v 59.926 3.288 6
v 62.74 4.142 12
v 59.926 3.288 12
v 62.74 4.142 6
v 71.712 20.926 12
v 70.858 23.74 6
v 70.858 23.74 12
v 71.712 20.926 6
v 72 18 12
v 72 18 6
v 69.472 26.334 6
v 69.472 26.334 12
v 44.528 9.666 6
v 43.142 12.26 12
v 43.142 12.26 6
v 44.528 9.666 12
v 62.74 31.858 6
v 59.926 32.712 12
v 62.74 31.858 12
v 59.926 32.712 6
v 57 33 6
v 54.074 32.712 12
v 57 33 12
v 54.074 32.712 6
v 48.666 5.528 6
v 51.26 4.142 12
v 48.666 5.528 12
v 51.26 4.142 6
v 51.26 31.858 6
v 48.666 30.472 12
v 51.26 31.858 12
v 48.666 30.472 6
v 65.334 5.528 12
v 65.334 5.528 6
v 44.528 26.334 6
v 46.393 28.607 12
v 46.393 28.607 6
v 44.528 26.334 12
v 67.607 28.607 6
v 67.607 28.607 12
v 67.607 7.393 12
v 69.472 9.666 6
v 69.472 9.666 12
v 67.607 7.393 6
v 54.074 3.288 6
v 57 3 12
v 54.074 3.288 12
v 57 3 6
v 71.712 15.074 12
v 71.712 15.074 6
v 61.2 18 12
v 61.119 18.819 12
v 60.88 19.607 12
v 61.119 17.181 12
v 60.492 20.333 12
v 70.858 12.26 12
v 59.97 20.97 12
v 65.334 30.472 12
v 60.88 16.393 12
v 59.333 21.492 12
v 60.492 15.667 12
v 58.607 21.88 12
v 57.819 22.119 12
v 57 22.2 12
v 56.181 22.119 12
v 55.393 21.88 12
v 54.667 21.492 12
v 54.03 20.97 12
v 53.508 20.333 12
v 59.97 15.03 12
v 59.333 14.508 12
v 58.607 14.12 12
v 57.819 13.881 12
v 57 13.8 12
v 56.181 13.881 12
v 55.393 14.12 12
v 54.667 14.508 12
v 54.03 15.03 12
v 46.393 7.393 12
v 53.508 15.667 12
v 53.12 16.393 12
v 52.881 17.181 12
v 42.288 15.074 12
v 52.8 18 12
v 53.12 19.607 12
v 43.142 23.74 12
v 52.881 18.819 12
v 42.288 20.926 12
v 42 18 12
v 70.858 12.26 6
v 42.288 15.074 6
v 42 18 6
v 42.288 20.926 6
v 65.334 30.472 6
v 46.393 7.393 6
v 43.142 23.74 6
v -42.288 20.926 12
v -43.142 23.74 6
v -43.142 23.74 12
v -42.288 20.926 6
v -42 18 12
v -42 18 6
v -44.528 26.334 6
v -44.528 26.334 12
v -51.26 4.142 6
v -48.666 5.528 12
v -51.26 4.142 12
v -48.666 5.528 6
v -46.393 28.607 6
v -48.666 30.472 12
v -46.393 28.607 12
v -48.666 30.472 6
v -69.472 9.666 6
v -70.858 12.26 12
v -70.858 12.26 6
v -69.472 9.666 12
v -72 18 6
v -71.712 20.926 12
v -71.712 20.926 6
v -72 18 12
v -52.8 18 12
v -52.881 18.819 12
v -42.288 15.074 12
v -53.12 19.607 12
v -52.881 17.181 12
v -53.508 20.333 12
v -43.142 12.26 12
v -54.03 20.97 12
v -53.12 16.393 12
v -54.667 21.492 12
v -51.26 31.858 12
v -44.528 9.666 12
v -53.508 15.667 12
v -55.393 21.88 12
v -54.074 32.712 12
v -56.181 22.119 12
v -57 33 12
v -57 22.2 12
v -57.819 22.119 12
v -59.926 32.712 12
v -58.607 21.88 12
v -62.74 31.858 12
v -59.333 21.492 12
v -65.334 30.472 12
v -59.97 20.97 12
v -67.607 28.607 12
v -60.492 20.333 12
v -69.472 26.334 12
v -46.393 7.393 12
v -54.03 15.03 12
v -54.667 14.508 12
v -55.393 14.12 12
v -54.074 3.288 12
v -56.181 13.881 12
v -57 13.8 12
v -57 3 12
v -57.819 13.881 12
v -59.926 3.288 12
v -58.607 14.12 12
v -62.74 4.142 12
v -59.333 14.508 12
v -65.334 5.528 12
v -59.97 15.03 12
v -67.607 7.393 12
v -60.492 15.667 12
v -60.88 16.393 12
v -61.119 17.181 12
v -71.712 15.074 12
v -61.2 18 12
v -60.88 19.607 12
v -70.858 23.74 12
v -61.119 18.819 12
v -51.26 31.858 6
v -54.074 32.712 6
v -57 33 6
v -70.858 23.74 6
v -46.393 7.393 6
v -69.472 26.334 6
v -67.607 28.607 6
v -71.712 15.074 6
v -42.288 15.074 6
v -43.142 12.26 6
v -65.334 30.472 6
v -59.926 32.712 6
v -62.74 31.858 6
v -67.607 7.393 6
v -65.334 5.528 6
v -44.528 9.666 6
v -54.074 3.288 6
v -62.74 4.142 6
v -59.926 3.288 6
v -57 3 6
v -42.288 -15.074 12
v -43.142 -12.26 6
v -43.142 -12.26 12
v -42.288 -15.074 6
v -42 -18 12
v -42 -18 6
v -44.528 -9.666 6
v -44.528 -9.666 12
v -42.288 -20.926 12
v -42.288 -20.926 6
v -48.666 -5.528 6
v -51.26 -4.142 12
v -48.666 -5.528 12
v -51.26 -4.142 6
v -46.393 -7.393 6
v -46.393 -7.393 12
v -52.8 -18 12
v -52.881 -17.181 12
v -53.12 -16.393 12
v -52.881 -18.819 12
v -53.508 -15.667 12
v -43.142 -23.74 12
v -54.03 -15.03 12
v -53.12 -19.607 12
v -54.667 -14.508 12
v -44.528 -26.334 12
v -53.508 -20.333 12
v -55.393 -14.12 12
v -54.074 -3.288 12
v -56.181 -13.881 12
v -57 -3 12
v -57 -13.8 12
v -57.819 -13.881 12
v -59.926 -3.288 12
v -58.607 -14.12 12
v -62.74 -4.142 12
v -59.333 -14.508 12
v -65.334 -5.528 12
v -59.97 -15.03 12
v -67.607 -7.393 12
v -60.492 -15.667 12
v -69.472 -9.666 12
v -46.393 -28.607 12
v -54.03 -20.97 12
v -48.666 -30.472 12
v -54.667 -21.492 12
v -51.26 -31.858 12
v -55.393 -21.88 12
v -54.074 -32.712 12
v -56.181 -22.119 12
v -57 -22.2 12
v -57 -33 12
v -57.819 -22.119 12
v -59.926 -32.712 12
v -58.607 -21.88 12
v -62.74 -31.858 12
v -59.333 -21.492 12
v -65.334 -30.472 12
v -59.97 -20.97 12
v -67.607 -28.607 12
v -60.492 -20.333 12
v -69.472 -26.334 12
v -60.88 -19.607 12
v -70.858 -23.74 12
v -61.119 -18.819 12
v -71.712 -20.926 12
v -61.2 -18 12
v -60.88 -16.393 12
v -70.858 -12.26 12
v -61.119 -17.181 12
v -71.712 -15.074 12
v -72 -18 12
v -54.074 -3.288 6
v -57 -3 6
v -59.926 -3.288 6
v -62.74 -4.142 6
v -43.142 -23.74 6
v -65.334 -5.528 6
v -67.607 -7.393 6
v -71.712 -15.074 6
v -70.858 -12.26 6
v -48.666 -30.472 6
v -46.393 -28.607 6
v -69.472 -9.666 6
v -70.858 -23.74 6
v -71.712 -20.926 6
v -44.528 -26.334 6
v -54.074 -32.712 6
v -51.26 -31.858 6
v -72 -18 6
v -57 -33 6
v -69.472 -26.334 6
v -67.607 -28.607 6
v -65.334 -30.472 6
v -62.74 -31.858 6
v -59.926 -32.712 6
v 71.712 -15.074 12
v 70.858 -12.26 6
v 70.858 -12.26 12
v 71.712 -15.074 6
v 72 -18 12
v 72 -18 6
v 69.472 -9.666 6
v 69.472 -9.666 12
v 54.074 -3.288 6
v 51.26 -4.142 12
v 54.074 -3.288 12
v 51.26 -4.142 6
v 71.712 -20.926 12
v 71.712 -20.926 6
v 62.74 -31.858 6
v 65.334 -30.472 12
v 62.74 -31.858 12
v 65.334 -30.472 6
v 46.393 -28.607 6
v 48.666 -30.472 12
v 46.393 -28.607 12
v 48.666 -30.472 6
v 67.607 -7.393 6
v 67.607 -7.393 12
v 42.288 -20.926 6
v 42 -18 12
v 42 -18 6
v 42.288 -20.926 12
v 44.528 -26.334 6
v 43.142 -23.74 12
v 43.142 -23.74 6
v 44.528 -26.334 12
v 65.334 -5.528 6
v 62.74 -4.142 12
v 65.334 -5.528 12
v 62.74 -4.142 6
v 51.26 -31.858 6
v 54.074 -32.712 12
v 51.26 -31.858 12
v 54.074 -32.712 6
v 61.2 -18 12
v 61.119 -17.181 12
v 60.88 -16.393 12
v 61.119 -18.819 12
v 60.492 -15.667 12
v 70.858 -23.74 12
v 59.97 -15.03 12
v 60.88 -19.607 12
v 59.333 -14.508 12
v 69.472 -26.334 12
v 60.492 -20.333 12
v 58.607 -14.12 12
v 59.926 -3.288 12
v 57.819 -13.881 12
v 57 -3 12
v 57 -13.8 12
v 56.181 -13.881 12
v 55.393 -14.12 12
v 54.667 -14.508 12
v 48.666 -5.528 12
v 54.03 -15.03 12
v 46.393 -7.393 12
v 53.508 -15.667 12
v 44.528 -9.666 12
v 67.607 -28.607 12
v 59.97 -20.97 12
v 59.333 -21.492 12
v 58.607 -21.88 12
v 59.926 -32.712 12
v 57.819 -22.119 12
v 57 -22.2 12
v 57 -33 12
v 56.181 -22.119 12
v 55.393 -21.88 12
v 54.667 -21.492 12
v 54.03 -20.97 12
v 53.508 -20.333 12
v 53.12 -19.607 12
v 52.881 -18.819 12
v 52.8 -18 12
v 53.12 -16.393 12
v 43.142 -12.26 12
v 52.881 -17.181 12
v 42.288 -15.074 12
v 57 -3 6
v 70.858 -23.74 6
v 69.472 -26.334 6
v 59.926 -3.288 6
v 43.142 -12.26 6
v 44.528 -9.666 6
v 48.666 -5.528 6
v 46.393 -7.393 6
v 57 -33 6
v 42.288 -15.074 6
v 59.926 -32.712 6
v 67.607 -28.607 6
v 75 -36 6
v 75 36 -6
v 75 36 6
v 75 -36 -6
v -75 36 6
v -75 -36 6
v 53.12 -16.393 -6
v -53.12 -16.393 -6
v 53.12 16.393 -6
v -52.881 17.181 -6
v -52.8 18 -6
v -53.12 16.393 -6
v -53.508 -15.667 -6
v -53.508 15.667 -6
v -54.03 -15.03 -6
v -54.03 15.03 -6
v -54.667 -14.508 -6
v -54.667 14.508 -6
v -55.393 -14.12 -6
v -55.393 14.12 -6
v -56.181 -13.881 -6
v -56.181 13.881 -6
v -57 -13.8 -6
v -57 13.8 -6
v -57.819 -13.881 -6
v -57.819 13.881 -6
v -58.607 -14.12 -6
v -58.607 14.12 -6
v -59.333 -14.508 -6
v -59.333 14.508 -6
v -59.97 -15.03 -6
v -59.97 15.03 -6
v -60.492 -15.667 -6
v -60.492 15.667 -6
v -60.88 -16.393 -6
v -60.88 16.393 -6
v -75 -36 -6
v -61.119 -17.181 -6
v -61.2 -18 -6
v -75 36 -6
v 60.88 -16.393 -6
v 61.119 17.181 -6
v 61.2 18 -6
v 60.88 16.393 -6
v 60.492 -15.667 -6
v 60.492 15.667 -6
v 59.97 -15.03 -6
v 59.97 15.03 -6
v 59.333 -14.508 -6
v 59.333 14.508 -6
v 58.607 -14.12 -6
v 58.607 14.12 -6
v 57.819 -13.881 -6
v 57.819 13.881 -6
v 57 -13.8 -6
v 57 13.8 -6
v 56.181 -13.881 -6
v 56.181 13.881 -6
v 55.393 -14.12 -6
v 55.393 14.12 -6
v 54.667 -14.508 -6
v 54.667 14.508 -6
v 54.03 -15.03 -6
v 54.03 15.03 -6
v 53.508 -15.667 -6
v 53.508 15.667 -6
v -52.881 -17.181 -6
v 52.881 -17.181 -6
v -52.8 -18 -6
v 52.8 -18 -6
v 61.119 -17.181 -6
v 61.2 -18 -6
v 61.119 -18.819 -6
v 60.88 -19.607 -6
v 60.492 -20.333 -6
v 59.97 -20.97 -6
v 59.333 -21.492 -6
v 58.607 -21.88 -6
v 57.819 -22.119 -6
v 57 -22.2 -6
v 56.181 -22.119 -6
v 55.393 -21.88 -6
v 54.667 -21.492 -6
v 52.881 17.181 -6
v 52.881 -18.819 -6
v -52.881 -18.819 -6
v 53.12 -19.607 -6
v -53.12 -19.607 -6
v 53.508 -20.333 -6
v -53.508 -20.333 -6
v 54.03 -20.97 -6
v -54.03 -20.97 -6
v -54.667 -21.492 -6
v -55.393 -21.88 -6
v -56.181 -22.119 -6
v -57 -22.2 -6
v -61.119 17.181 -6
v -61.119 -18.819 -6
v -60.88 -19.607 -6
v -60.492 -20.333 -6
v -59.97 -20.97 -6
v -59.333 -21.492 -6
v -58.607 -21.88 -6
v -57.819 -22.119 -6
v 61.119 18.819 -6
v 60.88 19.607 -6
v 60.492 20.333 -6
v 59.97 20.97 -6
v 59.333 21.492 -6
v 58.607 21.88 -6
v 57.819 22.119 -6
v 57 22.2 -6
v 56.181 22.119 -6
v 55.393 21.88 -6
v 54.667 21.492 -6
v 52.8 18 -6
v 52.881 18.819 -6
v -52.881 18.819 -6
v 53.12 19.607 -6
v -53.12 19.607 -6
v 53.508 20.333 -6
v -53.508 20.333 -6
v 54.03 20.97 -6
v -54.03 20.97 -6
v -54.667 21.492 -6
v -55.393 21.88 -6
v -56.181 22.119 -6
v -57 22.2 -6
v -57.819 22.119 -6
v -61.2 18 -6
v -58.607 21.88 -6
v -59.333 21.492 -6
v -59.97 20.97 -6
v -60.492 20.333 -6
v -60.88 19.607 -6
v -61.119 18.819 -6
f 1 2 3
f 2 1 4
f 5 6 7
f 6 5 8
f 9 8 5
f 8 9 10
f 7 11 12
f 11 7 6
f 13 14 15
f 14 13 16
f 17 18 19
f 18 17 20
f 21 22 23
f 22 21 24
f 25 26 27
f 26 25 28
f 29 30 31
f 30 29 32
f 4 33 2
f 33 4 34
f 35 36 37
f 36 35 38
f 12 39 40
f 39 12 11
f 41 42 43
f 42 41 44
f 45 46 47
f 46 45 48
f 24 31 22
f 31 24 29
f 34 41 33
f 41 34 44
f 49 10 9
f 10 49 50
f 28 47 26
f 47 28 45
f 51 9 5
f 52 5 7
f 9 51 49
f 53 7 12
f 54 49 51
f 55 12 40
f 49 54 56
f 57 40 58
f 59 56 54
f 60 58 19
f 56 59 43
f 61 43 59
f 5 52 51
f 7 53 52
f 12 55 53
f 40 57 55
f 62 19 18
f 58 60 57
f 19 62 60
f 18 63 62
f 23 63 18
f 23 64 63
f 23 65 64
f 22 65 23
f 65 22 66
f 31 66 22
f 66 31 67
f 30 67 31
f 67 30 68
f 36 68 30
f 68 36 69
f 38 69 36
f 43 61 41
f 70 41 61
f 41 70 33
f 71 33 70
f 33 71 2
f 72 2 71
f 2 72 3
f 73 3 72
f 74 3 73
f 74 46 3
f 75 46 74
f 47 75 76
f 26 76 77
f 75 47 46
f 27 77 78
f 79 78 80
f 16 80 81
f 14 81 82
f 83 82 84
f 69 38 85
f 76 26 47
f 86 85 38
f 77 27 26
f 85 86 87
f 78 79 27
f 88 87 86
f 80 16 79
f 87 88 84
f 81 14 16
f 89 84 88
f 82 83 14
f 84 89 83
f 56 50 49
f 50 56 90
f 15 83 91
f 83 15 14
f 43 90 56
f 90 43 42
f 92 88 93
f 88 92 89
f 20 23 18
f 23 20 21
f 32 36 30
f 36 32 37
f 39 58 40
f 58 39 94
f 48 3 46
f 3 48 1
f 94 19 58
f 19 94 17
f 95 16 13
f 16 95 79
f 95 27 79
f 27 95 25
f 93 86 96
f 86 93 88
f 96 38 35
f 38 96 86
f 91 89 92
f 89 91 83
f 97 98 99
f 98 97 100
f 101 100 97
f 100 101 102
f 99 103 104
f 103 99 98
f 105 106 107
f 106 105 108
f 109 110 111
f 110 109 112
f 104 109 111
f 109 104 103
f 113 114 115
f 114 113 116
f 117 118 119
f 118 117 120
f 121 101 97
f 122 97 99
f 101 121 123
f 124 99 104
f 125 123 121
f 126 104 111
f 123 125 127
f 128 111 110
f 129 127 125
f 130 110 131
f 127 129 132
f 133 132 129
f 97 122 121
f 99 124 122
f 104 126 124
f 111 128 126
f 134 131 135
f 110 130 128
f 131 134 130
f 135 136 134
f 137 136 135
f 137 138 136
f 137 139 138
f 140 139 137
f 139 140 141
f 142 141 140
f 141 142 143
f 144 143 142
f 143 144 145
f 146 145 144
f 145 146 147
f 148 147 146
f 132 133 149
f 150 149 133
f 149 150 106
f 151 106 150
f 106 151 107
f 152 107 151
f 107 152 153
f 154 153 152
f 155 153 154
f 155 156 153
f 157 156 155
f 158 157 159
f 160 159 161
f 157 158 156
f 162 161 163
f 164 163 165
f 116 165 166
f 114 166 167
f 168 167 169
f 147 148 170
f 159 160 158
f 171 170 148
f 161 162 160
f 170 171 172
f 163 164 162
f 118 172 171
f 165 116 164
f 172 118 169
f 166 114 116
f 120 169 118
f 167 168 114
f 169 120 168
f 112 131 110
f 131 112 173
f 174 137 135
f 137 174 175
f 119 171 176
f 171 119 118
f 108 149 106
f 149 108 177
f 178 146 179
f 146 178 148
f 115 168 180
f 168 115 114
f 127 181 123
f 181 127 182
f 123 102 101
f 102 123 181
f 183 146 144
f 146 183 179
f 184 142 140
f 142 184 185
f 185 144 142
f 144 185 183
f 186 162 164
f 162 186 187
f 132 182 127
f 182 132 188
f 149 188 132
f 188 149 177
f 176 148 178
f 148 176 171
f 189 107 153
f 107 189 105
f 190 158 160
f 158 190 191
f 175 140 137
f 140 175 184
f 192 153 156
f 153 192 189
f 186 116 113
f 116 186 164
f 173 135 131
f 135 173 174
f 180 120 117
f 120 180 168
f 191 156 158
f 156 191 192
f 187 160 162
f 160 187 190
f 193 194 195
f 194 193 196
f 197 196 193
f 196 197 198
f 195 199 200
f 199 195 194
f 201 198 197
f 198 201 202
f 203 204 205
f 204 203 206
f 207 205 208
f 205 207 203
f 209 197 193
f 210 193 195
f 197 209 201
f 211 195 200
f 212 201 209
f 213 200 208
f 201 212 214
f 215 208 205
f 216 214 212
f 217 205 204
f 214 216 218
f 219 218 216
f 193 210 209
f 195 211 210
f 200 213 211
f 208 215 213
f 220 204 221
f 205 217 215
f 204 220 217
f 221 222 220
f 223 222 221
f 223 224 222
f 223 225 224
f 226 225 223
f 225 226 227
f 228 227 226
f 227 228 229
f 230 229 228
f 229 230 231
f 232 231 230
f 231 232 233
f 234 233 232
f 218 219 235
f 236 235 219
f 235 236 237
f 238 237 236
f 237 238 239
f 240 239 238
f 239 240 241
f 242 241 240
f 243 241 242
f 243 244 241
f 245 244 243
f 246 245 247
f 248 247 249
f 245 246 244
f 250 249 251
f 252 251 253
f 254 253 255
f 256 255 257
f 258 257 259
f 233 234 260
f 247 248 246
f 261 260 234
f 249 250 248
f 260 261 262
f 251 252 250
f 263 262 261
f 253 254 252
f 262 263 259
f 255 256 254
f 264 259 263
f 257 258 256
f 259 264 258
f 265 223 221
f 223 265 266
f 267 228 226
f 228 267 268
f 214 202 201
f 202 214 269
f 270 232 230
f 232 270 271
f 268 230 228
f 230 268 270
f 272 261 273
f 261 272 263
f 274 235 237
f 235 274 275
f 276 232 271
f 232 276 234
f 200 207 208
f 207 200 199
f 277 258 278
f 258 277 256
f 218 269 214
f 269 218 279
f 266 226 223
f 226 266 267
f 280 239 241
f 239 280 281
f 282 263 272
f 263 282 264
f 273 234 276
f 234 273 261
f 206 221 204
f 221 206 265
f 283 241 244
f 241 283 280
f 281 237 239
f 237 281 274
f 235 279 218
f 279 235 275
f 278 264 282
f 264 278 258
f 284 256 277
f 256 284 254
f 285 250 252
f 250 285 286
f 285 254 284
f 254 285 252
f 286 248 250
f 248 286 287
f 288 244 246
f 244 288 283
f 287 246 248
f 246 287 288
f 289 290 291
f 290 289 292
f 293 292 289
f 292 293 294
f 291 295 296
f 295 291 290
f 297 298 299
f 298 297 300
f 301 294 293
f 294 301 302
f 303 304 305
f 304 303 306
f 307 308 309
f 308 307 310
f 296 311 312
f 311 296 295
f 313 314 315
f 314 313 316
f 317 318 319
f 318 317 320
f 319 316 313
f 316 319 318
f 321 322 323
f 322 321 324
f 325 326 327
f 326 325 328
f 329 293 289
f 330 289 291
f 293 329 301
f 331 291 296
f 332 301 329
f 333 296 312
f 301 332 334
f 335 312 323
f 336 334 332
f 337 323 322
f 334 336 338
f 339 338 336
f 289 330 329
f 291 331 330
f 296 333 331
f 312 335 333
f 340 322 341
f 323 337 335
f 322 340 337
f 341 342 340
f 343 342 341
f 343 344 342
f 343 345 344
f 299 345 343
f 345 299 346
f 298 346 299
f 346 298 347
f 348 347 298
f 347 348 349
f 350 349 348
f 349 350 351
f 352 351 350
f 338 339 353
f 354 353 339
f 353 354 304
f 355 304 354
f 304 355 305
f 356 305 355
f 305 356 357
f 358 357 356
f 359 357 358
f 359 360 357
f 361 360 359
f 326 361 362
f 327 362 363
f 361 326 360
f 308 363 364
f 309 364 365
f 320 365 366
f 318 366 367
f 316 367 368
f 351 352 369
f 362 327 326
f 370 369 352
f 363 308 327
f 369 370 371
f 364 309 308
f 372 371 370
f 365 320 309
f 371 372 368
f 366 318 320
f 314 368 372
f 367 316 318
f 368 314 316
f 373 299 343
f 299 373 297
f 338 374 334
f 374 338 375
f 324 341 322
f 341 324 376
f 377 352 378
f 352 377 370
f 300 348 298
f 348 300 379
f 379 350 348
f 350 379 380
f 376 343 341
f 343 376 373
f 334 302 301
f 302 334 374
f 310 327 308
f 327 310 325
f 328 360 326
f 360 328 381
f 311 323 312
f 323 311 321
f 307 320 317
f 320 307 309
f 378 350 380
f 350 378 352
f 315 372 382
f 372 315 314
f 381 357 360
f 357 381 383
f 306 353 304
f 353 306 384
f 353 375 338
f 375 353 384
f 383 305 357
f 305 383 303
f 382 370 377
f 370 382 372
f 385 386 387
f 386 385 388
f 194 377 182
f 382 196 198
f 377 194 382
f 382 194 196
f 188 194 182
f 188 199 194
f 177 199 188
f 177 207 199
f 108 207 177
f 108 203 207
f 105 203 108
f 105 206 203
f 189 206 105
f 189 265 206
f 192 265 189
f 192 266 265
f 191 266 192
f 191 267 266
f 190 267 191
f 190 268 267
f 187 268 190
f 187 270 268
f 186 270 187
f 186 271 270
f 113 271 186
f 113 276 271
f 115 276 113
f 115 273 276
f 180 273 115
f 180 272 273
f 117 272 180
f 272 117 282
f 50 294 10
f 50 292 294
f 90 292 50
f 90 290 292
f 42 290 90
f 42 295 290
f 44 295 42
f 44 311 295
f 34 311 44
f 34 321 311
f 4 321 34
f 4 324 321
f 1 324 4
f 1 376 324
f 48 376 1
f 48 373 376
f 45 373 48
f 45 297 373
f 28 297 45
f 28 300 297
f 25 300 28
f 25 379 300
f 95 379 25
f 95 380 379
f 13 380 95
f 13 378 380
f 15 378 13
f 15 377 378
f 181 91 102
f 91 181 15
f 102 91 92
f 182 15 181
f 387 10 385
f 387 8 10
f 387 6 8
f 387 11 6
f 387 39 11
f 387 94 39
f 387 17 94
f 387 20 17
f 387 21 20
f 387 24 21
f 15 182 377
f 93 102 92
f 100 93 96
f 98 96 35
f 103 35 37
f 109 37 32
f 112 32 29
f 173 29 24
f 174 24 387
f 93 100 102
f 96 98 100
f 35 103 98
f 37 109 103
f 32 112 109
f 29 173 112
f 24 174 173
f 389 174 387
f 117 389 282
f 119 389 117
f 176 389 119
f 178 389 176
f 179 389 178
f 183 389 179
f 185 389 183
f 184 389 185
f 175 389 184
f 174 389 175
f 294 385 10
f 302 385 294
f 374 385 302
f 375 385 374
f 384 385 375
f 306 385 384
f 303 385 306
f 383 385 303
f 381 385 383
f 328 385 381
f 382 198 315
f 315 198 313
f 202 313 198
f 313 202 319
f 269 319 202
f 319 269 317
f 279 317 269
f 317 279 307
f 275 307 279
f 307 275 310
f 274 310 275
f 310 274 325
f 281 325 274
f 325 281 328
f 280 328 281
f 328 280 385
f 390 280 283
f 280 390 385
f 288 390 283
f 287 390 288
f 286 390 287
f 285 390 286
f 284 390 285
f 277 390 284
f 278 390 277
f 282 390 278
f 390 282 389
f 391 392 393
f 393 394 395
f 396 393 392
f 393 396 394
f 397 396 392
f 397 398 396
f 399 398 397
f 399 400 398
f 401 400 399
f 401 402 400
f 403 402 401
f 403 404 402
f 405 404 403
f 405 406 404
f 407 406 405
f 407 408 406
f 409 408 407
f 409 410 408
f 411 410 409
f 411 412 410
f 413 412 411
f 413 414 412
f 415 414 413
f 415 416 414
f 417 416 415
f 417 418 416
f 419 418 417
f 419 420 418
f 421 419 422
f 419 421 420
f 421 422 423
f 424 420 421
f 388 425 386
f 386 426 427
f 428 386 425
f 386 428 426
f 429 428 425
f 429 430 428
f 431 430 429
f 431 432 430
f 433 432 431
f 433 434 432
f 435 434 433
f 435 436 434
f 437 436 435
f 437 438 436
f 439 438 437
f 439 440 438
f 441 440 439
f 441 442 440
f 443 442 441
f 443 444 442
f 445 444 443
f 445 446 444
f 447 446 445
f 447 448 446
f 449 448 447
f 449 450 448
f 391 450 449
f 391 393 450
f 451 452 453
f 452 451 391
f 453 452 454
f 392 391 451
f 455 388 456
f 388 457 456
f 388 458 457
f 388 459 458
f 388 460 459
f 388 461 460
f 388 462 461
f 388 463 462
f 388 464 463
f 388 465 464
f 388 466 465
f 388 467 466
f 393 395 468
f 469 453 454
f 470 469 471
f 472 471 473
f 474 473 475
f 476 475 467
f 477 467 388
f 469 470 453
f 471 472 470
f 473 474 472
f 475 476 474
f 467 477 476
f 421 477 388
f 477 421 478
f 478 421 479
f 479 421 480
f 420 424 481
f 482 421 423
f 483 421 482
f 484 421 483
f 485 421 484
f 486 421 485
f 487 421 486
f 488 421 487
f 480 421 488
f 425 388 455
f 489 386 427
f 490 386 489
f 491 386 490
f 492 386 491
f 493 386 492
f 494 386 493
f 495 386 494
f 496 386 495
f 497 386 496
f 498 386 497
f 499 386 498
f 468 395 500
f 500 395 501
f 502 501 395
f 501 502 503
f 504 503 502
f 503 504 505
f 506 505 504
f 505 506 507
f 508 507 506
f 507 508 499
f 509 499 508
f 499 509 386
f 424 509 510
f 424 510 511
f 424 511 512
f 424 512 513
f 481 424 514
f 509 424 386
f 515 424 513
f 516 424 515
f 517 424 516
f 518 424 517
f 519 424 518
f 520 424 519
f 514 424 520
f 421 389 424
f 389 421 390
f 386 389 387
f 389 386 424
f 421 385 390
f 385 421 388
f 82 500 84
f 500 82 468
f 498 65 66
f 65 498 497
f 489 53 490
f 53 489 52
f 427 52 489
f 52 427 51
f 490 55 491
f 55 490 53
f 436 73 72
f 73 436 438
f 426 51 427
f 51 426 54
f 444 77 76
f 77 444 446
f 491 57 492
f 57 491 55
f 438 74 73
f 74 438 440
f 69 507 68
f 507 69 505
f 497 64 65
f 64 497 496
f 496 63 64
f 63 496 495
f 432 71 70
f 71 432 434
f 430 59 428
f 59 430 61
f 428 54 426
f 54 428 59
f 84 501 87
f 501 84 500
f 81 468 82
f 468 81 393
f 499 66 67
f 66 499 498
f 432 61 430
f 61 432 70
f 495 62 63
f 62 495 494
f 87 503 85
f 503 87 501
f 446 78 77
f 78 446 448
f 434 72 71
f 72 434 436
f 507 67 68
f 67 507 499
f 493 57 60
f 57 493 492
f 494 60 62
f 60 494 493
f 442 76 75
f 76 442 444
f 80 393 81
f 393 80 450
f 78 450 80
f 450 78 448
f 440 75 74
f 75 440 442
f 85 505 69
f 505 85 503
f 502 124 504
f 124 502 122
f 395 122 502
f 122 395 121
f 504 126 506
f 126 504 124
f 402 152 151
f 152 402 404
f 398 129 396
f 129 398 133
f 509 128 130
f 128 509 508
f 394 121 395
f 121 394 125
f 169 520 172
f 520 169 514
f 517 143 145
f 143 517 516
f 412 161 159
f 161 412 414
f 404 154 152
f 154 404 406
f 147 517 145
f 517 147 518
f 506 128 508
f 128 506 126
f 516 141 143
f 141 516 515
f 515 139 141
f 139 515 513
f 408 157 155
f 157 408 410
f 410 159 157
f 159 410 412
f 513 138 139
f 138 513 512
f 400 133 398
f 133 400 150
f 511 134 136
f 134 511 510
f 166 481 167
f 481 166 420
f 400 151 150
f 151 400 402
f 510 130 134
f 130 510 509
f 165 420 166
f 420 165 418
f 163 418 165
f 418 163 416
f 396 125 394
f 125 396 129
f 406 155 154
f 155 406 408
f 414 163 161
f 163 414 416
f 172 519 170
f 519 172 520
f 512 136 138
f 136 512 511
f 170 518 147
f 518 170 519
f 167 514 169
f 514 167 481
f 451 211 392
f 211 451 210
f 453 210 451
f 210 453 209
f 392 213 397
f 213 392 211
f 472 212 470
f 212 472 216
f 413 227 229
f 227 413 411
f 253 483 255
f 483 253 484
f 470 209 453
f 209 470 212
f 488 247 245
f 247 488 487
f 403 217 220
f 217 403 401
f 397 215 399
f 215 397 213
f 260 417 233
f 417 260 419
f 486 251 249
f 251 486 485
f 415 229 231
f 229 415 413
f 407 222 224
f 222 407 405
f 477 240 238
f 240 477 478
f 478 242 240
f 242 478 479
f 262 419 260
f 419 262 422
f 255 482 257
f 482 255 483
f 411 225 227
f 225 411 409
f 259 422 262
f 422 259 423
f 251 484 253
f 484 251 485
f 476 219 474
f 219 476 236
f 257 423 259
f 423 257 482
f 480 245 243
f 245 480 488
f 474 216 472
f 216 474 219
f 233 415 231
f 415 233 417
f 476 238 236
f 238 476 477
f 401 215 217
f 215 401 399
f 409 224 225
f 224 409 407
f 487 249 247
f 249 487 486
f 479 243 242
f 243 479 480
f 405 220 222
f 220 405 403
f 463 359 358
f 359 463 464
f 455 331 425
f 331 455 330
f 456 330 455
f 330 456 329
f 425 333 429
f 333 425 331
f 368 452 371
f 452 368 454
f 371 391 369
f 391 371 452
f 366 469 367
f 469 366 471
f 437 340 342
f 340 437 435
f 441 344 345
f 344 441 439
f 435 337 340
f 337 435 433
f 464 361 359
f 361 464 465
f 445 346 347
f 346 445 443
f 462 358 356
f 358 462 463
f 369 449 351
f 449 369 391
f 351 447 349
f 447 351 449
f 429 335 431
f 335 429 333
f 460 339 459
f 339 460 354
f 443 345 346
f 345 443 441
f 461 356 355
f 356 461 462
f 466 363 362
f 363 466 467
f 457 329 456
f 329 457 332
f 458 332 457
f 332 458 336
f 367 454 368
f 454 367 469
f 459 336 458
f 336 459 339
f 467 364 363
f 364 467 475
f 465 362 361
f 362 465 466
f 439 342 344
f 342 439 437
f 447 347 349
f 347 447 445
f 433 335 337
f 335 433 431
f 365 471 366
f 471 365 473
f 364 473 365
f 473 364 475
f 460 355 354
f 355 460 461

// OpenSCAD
$fn = 32;

// ----------------------------------------------------------------------
// Anchor pads 150 x 72 x 18
// four corner bosses with anchor holes
// ----------------------------------------------------------------------

// --- parameters (mm) ---
plate = [150, 72, 12];  // base plate size (x, y, z)
pads = 4;               // boss count, one per corner
edge = 18;              // boss centre offset from the plate edge
boss_d = 30;            // boss diameter
boss_h = 6;             // boss height above the base plate
hole_d = 8.4;           // hole diameter

// --- derived feature positions (mm) ---
height = plate[2] + boss_h;      // = 18   overall height of the part
corner_x = plate[0] / 2 - edge;  // = 57   boss centre X
corner_y = plate[1] / 2 - edge;  // = 18   boss centre Y
feature_centers = [
  [corner_x, corner_y],
  [-corner_x, corner_y],
  [-corner_x, -corner_y],
  [corner_x, -corner_y]
];   // boss centres, anchor holes are drilled there

// base plate, four bosses standing on it, anchor holes all the way through
difference() {
  union() {
    cube(plate, center = true);
    for (centre = feature_centers)
      translate([centre[0], centre[1], plate[2] / 2 - 1])
        cylinder(d = boss_d, h = boss_h + 1);
  }
  for (centre = feature_centers)
    translate([centre[0], centre[1], -height])
      cylinder(d = hole_d, h = 2 * height + 2);  // through boss and plate
}
